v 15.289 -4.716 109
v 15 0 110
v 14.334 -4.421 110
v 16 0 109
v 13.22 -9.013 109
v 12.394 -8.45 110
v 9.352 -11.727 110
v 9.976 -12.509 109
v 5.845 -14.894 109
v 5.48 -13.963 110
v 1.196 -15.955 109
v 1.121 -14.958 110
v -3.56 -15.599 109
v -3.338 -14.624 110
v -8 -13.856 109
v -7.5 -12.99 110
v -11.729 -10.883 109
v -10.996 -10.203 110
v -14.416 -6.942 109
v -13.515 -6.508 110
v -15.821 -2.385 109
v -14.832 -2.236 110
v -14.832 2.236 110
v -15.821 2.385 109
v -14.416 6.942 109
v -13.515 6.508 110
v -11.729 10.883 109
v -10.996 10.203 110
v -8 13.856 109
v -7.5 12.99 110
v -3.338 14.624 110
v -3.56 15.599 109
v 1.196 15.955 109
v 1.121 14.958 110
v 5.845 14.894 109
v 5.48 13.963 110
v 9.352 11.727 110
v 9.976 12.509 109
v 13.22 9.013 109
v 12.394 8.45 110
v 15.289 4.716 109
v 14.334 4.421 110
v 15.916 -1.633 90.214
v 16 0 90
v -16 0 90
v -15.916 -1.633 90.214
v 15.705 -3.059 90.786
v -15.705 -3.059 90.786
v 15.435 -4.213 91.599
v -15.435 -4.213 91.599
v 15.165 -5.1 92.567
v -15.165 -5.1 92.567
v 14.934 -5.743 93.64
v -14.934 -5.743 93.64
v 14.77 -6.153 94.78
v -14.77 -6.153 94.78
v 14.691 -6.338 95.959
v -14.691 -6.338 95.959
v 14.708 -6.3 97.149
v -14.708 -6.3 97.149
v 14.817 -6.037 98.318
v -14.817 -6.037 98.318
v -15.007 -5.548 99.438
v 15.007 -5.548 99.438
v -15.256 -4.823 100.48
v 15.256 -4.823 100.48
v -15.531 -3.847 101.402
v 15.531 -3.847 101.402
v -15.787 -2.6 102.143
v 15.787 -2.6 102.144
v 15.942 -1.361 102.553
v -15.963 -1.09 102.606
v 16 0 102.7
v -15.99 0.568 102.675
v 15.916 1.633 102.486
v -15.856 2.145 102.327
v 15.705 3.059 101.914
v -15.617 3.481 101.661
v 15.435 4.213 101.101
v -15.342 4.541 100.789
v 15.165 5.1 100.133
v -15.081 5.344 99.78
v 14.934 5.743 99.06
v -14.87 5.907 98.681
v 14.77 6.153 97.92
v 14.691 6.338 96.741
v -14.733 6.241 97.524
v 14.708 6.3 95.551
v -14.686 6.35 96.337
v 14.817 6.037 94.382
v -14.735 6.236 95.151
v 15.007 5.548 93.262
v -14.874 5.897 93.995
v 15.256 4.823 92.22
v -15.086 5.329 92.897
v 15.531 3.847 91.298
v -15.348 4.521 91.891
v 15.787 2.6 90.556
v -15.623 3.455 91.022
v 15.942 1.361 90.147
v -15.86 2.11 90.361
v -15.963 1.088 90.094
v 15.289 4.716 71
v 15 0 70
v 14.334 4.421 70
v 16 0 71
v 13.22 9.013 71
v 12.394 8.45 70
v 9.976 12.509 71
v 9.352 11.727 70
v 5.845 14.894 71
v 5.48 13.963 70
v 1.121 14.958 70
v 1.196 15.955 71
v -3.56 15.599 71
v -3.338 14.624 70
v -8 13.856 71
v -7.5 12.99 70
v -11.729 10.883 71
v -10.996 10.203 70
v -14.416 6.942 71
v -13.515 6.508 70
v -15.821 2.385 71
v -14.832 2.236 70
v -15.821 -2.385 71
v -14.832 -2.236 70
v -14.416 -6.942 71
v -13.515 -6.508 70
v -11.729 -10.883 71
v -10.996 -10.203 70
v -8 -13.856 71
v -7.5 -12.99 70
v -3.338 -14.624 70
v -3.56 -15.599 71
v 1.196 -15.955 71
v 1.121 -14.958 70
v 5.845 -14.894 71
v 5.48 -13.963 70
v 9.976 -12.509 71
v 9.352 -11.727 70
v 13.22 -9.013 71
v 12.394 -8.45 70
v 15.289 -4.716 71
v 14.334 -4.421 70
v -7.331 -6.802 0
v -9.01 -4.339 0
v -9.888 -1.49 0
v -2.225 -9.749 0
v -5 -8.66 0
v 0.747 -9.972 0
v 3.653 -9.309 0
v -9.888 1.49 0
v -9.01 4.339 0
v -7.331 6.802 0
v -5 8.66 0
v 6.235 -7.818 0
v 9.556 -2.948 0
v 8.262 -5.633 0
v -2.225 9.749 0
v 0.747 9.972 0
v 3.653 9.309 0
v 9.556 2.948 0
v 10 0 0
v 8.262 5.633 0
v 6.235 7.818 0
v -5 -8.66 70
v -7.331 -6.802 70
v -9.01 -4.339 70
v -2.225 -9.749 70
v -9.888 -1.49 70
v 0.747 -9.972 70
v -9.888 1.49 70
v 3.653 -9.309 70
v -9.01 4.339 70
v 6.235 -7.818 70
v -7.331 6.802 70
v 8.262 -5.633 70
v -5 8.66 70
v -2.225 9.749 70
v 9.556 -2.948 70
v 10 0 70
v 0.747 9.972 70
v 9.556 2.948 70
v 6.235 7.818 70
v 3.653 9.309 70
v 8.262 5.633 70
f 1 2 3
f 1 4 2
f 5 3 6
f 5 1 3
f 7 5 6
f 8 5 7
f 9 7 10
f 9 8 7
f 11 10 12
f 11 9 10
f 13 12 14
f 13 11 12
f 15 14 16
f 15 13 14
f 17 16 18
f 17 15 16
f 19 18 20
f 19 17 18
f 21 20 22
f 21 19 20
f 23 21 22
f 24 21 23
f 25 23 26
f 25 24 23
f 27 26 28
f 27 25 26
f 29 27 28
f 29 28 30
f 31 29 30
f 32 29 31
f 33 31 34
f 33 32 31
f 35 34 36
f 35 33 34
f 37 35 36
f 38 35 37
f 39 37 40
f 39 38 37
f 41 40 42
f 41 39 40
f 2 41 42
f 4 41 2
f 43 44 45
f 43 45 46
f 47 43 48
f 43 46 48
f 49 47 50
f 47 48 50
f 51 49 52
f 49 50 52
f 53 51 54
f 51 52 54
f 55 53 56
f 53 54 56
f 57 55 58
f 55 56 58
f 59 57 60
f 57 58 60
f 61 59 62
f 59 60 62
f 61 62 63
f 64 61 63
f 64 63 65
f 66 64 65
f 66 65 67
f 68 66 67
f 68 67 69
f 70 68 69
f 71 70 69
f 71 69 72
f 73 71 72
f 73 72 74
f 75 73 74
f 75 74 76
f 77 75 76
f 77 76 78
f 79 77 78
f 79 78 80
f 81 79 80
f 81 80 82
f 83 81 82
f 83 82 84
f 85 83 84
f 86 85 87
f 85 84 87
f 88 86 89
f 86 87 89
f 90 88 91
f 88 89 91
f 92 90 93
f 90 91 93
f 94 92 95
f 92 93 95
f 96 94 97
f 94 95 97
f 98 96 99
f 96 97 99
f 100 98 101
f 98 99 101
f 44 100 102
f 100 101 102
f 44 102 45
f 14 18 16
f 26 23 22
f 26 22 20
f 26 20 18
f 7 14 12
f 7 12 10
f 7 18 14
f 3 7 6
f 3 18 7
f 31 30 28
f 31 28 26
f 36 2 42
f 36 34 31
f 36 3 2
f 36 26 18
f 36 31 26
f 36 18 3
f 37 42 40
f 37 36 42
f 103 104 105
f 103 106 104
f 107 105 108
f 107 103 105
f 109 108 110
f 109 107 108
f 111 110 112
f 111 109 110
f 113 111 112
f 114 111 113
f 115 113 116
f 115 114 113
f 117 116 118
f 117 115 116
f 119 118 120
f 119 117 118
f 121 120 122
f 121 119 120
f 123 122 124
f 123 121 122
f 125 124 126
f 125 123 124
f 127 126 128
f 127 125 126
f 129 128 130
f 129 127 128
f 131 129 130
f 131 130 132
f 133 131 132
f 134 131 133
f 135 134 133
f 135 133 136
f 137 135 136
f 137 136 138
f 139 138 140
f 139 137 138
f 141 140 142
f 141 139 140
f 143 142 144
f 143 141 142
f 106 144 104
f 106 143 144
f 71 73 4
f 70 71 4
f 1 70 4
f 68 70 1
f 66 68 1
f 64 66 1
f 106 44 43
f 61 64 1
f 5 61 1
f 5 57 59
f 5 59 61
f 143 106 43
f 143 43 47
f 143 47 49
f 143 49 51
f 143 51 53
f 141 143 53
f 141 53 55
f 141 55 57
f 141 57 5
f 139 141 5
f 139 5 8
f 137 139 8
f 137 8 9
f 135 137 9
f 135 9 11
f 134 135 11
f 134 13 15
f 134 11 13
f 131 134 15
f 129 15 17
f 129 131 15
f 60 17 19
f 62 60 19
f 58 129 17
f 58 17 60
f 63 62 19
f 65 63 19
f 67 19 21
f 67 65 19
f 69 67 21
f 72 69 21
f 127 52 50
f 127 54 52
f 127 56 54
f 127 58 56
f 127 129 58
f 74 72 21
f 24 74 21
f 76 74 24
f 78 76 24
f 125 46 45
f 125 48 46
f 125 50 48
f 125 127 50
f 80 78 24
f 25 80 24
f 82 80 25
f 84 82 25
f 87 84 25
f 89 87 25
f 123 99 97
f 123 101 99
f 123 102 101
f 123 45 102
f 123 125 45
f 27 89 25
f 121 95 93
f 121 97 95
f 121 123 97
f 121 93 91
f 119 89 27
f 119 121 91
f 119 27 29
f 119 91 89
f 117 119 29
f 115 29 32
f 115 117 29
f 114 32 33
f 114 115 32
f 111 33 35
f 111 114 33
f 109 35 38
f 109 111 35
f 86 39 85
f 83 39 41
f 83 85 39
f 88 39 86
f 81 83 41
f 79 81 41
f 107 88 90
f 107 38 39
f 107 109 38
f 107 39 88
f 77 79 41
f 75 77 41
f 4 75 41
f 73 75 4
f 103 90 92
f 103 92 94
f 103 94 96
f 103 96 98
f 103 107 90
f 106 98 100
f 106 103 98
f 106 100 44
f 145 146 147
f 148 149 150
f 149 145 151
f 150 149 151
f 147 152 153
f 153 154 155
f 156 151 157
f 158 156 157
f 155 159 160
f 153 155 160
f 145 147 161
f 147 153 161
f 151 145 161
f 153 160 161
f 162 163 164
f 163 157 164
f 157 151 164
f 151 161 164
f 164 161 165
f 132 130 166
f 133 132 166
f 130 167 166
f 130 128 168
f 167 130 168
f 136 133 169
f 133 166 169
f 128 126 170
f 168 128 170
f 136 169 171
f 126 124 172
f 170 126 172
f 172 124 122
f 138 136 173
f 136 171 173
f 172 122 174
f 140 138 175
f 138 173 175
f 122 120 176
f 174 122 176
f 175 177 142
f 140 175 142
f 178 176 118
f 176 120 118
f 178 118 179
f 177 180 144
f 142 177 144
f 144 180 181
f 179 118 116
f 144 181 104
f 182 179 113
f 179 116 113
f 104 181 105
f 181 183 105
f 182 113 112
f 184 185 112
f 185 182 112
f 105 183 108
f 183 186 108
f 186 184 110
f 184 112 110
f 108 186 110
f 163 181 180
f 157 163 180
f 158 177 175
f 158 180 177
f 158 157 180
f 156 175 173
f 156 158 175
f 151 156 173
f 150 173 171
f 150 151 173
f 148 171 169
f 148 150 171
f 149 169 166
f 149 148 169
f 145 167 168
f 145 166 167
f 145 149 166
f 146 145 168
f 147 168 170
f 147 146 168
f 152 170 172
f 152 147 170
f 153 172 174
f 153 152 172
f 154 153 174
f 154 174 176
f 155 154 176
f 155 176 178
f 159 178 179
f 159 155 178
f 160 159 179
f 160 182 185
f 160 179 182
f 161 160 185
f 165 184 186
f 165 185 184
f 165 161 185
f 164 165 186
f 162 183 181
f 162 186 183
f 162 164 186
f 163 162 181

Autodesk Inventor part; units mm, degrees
ref_plane "YZ Plane" through (0, 0, 0) normal (1, 0, 0) x (0, 1, 0)
ref_plane "XZ Plane" through (0, 0, 0) normal (0, 1, 0) x (-1, 0, 0)
ref_plane "XY Plane" through (0, 0, 0) normal (0, 0, 1) x (1, 0, 0)
sketch "Sketch1" plane through (0, 0, 0) normal (0, 0, 1) x (1, 0, 0)
  circle A0 centre (0, 0) radius 10
  dimension "d0" = 20
extrude "Extrusion1" add sketch "Sketch1" along normal blind 70
sketch "Sketch2" plane through (0, 0, 70) normal (0, 0, 1) x (1, 0, 0)
  circle A0 centre (0, 0) radius 16
  dimension "d3" = 32
extrude "Extrusion2" add sketch "Sketch2" along normal blind 40
sketch "Sketch3" plane through (0, 0, 0) normal (1, 0, 0) x (0, 1, 0)
  line L0 (16, 70) -> (-16, 70) projected
  point P0 (0, 0)
  point P1 (0, 96.35)
  dimension "d6" = 26.35
hole "Hole1" at (0, 0, 96.35) direction (-1, 0, 0) diameter 12.7 end through all both
thread "Thread1" size "M20x2.5" class "6g" standard "ANSI Metric M Profile" full length
chamfer "Chamfer1" distance 1 angle 45 2 edges at (-16, 0, 110) (-16, 0, 70)
properties part number "CompressionGripAttachment"
